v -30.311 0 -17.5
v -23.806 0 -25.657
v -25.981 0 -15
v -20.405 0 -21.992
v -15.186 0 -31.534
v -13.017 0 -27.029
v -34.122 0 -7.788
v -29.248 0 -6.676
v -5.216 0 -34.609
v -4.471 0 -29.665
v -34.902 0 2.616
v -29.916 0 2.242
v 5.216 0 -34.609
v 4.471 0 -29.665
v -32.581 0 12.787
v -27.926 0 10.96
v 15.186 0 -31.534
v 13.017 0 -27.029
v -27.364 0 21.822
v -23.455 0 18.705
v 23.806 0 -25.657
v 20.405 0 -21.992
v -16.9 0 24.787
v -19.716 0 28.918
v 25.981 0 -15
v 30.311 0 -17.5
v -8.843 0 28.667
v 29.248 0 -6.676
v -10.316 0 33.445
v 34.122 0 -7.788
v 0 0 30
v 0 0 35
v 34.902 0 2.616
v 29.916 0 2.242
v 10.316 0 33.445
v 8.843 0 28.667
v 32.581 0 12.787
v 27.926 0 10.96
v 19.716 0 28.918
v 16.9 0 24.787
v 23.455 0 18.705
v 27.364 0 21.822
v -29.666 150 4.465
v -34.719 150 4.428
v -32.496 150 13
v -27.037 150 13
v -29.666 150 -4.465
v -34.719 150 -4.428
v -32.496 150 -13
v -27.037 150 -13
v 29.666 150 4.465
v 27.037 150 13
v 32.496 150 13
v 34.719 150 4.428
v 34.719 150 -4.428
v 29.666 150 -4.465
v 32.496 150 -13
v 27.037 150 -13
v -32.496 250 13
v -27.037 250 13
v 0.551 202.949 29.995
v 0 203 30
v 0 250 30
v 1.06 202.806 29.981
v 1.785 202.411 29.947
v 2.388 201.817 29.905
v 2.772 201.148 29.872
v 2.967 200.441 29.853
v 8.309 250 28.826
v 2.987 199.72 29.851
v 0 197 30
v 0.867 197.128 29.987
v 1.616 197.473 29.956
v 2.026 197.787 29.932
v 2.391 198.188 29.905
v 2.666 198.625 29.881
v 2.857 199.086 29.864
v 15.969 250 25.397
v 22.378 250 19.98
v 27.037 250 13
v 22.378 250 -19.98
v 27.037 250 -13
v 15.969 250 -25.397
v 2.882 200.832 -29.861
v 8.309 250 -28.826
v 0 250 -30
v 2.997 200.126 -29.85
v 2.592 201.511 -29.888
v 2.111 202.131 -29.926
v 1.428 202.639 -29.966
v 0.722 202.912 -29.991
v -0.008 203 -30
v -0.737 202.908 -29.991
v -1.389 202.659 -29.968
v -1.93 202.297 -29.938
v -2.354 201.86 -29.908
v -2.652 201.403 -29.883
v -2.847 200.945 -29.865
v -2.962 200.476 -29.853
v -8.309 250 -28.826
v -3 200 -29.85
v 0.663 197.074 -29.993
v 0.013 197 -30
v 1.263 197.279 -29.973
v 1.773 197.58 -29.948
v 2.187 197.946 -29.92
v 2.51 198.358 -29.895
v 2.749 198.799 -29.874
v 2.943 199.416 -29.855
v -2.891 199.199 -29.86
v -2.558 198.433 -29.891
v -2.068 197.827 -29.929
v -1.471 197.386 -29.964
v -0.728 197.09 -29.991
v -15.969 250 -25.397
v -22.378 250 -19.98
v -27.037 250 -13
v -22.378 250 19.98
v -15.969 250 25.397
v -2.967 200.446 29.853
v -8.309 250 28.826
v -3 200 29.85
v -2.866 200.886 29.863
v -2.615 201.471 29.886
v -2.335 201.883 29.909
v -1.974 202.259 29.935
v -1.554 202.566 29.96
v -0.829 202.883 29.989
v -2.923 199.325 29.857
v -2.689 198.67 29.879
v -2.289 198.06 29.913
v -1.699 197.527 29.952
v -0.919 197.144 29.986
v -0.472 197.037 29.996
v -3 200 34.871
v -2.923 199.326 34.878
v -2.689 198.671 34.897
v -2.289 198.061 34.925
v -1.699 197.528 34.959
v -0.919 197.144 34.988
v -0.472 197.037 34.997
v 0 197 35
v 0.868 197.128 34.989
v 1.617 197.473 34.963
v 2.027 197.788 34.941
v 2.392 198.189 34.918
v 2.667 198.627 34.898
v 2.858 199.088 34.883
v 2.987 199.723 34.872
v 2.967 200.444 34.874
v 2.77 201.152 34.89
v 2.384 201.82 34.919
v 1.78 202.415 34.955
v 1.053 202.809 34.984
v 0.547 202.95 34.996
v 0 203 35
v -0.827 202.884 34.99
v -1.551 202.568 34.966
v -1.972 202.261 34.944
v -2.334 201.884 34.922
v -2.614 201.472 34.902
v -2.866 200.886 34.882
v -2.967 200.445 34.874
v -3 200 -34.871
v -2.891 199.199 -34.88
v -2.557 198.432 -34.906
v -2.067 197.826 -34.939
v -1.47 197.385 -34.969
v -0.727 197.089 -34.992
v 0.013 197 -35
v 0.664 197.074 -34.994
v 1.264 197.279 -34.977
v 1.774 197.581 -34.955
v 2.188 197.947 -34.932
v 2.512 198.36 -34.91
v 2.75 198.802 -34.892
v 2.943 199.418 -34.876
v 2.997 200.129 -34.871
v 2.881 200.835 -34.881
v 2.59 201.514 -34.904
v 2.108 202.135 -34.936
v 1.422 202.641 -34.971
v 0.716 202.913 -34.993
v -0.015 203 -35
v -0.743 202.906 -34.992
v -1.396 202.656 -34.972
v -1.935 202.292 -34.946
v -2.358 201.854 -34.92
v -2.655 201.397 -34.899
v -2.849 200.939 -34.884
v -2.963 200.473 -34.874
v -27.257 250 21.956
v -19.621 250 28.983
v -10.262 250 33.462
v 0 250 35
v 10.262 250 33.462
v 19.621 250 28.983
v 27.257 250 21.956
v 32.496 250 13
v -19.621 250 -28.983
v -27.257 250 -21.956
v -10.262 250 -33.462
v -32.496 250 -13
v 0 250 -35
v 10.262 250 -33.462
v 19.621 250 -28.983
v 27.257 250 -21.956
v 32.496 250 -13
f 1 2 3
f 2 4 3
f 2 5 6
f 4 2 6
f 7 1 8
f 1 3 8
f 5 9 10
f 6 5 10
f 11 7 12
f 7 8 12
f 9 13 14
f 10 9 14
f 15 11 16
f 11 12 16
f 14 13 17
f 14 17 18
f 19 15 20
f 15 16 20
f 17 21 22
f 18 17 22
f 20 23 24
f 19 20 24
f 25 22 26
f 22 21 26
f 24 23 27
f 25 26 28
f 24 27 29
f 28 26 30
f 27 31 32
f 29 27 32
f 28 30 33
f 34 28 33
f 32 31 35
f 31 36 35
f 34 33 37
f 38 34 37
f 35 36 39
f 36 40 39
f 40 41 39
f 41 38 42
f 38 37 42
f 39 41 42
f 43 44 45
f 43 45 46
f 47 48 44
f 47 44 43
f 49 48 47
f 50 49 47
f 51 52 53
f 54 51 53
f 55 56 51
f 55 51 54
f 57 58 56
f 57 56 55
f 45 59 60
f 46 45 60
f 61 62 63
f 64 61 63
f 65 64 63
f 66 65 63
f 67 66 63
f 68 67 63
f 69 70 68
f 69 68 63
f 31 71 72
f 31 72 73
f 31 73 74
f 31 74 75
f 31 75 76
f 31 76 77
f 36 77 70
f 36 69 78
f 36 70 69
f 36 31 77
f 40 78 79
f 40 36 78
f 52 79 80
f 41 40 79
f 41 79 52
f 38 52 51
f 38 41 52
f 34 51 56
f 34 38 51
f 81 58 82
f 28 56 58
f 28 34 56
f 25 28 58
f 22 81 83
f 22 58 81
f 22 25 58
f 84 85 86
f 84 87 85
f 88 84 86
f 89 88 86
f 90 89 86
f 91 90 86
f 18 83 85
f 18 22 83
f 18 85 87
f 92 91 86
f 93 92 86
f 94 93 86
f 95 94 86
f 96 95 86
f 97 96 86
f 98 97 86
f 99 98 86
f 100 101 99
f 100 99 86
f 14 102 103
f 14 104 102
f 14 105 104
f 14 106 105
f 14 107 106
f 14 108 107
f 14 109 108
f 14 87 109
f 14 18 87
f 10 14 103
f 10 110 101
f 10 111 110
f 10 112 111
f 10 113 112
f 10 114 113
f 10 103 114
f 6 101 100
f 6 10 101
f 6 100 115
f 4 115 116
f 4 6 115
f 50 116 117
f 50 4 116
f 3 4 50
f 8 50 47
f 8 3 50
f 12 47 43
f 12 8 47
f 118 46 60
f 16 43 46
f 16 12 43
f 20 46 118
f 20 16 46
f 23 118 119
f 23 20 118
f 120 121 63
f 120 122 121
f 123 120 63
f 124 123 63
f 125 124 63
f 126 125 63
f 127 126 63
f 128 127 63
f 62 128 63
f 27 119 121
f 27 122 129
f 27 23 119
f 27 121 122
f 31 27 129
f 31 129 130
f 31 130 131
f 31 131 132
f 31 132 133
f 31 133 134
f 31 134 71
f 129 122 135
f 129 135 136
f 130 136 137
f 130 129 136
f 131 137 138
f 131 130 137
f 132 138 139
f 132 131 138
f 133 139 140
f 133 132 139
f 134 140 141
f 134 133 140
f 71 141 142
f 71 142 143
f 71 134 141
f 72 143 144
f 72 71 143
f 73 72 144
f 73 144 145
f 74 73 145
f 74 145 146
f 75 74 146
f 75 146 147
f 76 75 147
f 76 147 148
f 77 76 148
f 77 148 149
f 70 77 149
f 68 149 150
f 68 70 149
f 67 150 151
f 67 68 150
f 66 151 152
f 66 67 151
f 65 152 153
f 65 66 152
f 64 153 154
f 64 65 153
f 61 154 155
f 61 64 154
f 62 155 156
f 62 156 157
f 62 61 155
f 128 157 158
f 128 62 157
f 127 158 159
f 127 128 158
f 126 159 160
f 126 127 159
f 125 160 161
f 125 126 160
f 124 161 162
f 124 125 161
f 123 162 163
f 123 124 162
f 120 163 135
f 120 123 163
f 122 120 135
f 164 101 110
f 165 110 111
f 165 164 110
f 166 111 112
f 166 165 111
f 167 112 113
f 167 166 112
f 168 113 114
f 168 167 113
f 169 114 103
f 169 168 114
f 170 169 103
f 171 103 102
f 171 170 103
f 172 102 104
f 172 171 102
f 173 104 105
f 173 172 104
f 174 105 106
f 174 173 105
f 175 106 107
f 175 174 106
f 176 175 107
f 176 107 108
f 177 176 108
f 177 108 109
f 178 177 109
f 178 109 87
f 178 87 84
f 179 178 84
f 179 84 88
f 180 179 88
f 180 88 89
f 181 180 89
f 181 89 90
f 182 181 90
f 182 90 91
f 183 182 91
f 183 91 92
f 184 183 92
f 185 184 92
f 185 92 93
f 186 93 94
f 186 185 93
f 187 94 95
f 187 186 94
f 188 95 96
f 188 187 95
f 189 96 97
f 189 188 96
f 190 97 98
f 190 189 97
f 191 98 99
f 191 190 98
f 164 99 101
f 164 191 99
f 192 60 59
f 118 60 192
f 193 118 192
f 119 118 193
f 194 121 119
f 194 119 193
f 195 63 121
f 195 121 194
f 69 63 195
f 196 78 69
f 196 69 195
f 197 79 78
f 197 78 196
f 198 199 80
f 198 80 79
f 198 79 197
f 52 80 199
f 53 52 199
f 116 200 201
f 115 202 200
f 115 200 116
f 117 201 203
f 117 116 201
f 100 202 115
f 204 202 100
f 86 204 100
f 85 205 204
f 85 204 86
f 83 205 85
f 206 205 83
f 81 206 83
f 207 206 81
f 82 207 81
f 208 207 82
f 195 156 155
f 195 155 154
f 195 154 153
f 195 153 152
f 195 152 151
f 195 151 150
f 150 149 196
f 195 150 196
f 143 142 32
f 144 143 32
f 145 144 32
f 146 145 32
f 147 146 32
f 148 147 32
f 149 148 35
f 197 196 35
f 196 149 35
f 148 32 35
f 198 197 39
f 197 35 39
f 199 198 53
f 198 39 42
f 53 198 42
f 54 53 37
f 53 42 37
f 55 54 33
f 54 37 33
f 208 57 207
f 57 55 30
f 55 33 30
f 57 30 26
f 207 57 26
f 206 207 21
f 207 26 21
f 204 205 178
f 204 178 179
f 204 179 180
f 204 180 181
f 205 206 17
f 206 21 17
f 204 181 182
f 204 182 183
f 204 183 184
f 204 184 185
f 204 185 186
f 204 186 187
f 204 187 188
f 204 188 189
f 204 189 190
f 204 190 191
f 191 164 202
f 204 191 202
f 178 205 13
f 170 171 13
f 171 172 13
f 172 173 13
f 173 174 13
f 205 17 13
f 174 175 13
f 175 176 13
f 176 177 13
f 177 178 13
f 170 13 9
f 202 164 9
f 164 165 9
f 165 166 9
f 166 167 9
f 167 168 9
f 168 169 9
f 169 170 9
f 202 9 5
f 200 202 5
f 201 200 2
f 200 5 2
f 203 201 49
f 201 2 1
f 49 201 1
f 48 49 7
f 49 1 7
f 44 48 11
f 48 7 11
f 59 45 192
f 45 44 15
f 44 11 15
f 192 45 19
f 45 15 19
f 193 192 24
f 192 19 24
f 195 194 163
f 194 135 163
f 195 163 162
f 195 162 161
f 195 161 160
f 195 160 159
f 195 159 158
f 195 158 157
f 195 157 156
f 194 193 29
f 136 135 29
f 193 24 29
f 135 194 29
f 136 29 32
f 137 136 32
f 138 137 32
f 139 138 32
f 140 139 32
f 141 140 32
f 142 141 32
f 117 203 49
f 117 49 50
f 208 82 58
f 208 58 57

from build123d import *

# Parameters (mm, degrees)
ESQUISSE3_R                  = 35
ESQUISSE3_R_2                = 30
BOSS_EXTRU_3_DEPTH           = 250
ESQUISSE4_W                  = 124.19
ESQUISSE4_H                  = 26
ENL_V_MAT_EXTRU_1_DEPTH      = 100
ENL_V_MAT_EXTRU_2_DEPTH      = 100
ENL_V_MAT_EXTRU_2_DEPTH_BACK = 100
ESQUISSE6_R                  = 3


with BuildPart() as part:
    # Esquisse3 → Boss.-Extru.3 (new body)
    with BuildSketch(Plane(origin=(0, 0, 0), x_dir=(1, 0, 0), z_dir=(0, 1, 0))):
        with Locations(Location((0, 0, 0), (0, 0, 270))):
            Circle(ESQUISSE3_R)
        with Locations(Location((0, 0, 0), (0, 0, 270))):
            Circle(ESQUISSE3_R_2, mode=Mode.SUBTRACT)
    extrude(amount=BOSS_EXTRU_3_DEPTH)

    # Esquisse4 → Enlèv. mat.-Extru.1 (cut)
    with BuildSketch(Plane(origin=(0, 250, 0), x_dir=(1, 0, 0), z_dir=(0, 1, 0))):
        Rectangle(ESQUISSE4_W, ESQUISSE4_H)
    extrude(amount=-ENL_V_MAT_EXTRU_1_DEPTH, mode=Mode.SUBTRACT)

    # Esquisse6 → Enlèv. mat.-Extru.2 (cut, two sides: drawn at the far end of the back side and taken through both)
    with BuildSketch(Plane.XY.offset(-ENL_V_MAT_EXTRU_2_DEPTH_BACK)):
        with Locations(Location((0, 200, 0), (0, 0, 180))):
            Circle(ESQUISSE6_R)
    extrude(amount=ENL_V_MAT_EXTRU_2_DEPTH + ENL_V_MAT_EXTRU_2_DEPTH_BACK, mode=Mode.SUBTRACT)


solid = part.part
